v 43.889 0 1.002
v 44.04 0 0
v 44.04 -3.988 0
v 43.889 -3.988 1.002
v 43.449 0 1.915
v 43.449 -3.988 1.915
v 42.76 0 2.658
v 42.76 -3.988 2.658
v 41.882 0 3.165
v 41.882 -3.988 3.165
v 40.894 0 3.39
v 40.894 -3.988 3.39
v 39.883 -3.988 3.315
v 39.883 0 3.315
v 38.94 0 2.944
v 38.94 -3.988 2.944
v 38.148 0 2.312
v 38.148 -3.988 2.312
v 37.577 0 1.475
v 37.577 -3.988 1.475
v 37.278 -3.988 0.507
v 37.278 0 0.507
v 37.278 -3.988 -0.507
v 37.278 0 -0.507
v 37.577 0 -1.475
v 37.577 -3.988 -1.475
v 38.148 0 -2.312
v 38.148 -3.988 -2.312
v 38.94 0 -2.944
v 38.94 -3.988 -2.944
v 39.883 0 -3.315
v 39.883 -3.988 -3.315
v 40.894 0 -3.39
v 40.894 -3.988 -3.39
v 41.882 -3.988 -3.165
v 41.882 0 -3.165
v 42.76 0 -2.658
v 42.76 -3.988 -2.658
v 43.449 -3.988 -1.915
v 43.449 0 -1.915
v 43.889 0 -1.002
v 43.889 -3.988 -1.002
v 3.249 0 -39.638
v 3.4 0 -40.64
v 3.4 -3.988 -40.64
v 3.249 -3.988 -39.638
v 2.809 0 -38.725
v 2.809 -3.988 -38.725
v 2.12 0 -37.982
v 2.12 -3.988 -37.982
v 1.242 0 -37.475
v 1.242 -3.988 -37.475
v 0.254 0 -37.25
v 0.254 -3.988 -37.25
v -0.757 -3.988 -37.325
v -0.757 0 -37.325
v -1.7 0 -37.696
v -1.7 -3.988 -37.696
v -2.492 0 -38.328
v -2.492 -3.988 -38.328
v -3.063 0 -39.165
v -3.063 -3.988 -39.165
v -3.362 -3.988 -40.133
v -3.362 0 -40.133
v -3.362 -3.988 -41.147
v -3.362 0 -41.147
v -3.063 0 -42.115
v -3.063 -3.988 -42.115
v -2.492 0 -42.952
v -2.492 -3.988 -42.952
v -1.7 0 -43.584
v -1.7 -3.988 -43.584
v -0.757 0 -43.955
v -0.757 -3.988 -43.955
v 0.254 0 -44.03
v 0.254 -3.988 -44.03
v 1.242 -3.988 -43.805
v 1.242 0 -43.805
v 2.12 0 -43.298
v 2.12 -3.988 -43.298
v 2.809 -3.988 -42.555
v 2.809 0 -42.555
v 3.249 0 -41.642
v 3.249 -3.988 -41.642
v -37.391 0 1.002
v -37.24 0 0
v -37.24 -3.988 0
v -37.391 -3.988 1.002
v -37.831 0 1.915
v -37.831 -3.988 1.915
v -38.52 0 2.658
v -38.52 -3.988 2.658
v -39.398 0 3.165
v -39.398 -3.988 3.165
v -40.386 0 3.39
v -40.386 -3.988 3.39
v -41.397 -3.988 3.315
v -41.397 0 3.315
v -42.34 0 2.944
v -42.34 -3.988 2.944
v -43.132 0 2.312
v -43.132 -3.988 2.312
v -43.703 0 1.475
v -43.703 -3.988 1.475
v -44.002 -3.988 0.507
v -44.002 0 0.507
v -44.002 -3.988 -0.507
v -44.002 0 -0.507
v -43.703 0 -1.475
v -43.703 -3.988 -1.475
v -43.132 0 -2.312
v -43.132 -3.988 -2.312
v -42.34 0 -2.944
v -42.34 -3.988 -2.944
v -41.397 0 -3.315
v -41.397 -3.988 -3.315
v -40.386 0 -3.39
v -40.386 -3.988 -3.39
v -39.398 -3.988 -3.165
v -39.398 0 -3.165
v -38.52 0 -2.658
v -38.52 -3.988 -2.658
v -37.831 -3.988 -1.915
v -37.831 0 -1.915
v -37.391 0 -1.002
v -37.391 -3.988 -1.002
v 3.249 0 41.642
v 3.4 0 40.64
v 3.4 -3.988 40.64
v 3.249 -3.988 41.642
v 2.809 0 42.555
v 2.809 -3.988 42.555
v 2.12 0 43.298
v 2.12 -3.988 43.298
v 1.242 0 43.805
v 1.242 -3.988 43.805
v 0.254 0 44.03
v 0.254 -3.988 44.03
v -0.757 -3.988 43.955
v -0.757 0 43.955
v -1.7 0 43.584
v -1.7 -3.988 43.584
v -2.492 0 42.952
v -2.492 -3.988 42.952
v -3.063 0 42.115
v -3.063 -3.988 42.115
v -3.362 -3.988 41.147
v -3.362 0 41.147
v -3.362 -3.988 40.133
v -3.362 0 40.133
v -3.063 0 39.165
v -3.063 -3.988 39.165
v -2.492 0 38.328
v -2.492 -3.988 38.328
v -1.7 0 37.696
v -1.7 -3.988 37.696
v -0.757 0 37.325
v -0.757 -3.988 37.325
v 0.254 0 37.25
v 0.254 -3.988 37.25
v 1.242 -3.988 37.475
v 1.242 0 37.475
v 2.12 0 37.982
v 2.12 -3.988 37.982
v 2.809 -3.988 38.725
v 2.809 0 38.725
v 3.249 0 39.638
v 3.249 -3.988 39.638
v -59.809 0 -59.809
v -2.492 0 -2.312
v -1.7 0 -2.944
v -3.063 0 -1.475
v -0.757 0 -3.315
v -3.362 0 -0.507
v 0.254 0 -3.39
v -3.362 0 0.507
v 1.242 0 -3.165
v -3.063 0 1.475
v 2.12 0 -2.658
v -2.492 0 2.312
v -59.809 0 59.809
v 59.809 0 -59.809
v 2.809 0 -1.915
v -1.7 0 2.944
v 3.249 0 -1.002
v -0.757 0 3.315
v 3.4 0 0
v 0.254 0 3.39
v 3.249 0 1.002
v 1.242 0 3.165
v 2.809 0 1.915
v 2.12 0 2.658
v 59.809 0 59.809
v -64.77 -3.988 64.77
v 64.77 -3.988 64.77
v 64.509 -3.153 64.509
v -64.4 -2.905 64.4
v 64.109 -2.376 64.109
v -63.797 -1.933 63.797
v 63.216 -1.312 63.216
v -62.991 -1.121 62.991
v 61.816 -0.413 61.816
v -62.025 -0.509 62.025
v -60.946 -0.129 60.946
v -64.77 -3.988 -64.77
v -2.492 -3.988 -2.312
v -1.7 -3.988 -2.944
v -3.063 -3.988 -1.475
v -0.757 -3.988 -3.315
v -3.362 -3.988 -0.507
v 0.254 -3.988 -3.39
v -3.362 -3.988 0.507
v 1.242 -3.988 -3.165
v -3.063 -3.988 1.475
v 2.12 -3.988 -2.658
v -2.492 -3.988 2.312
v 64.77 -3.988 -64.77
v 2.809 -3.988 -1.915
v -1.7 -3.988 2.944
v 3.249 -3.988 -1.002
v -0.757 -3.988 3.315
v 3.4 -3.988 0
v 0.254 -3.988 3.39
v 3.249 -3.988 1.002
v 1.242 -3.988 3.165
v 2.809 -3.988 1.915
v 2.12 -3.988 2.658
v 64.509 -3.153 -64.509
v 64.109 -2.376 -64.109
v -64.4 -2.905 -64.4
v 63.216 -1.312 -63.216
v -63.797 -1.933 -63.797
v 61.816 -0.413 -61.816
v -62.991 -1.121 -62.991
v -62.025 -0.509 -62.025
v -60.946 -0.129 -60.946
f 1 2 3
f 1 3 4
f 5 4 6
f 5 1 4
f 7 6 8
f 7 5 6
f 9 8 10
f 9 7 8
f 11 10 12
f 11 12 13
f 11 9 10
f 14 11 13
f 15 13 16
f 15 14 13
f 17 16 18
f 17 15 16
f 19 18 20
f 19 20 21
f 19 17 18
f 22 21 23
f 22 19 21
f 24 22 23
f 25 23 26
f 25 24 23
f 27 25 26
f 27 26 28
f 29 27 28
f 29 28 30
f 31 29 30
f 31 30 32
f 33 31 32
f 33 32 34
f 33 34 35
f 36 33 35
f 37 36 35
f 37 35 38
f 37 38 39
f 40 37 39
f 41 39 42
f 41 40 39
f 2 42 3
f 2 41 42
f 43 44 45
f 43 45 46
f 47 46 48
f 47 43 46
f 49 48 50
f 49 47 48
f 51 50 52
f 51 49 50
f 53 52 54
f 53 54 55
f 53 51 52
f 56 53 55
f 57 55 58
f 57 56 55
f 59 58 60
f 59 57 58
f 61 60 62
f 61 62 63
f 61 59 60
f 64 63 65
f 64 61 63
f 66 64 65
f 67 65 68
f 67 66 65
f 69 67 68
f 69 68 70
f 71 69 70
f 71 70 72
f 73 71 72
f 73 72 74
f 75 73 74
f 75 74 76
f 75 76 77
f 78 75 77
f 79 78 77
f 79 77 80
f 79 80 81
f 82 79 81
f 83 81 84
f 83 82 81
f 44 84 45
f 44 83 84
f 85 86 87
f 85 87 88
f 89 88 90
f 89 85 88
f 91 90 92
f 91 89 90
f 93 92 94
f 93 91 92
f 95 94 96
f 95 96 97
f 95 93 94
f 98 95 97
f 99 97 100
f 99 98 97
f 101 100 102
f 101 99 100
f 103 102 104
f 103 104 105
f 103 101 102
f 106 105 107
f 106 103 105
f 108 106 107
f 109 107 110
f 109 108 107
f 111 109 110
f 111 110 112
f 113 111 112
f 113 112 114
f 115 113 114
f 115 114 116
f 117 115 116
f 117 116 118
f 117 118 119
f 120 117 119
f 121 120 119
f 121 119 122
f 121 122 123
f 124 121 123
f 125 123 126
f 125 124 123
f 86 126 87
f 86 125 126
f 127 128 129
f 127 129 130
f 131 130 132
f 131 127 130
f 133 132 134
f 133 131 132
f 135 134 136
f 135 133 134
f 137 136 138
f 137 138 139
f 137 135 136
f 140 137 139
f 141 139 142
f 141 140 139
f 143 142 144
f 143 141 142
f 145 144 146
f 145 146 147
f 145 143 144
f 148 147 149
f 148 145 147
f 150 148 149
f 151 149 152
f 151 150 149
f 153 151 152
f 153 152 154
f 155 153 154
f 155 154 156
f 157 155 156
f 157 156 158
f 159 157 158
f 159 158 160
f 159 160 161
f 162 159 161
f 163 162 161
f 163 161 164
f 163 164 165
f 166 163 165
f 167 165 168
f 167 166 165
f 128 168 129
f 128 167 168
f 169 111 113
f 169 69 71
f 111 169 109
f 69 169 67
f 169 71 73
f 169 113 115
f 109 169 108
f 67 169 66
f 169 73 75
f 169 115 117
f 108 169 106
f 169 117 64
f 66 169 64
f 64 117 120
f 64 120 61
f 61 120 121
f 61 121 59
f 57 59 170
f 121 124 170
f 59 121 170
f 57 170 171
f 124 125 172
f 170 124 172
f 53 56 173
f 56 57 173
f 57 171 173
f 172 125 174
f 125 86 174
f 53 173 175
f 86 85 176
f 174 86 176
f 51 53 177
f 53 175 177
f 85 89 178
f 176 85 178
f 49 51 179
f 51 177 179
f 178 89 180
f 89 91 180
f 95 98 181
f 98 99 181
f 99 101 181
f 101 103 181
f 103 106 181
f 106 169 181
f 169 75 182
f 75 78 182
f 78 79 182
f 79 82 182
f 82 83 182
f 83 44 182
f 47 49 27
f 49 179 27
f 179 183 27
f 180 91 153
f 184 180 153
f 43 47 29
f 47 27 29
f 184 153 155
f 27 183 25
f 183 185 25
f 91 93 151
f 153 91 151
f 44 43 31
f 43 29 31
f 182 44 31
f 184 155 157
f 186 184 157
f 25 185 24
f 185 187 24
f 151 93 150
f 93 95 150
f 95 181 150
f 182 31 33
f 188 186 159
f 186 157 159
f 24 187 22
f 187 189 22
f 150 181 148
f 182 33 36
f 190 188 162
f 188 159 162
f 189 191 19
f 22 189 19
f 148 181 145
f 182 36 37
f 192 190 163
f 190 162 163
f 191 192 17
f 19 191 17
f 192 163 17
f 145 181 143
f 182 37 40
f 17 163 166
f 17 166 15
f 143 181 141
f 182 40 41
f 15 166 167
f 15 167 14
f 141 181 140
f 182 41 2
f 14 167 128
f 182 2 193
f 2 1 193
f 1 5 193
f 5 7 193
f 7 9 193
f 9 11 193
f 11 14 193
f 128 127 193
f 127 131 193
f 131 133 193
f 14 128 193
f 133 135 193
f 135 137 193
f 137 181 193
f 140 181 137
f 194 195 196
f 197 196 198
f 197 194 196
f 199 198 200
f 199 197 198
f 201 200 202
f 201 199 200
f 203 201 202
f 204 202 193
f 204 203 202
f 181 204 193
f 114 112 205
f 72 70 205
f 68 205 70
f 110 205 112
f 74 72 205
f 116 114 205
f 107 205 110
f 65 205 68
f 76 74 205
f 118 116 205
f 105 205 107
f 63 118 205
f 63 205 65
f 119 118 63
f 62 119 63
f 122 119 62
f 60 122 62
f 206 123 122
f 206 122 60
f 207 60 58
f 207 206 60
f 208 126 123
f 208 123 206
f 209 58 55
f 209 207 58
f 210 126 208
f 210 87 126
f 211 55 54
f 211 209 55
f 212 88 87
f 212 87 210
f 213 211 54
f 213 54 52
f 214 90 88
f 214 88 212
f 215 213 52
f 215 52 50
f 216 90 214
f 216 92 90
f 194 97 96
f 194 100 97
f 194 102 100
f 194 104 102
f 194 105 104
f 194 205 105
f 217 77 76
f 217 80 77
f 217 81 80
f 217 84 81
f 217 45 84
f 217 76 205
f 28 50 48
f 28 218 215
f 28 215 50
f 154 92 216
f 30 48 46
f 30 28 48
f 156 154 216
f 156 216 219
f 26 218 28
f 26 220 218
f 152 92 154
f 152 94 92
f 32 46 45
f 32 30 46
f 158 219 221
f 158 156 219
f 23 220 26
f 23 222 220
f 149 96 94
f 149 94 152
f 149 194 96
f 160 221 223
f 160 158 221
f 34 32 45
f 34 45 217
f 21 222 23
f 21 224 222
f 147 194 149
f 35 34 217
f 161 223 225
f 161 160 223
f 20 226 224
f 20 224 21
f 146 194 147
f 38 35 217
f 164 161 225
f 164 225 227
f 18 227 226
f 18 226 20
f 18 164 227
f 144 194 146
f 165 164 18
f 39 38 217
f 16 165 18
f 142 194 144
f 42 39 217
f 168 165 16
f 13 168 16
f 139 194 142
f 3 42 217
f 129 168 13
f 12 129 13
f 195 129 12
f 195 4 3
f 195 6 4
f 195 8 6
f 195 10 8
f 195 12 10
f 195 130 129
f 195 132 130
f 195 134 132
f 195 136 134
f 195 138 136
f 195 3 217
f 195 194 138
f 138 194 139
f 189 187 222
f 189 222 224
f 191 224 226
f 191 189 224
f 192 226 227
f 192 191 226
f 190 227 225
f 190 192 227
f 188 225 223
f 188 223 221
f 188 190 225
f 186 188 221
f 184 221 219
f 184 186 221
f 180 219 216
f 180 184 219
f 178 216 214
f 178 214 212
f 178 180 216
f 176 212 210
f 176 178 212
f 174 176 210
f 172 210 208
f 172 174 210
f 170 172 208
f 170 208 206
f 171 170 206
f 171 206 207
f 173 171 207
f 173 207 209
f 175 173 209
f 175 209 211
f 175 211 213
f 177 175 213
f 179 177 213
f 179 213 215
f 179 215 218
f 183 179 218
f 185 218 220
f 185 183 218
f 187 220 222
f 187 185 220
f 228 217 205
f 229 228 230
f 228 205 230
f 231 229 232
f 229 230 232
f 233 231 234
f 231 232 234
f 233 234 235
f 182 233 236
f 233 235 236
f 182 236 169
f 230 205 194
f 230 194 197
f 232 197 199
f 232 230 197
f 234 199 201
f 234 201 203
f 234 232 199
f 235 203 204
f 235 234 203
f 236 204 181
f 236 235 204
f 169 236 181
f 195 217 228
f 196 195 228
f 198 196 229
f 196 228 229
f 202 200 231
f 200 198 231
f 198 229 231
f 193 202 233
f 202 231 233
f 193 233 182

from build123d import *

# Parameters (mm, degrees)
F0_W        = 129.54
F0_H        = 129.54
F0_R        = 3.39979
F1_DEPTH    = 3.9878
F2_T1_DEPTH = 154.3459968354
F2_T3_DEPTH = 154.3459968354


# Not quite as in the source:
# - a fillet or chamfer that OpenCascade refuses, or shapes differently, is made with other operations: its cross-section is extruded or revolved along the edge and cut away or added


with BuildPart() as f1:
    # F0 (on Front) → F1 (new body)
    with BuildSketch(Plane.XZ):
        Rectangle(F0_W, F0_H)
        with Locations((0, -40.64)):
            Circle(F0_R, mode=Mode.SUBTRACT)
        with Locations((-40.64, 0)):
            Circle(F0_R, mode=Mode.SUBTRACT)
        Circle(F0_R, mode=Mode.SUBTRACT)
        with Locations((40.64, 0)):
            Circle(F0_R, mode=Mode.SUBTRACT)
        with Locations((0, 40.64)):
            Circle(F0_R, mode=Mode.SUBTRACT)
    extrude(amount=F1_DEPTH)

    # F2: fillet of radius 5.08 on 4 edges, made by hand

    # F2_s2 → F2_t1 (cut)
    with BuildSketch(Plane.XY.offset(-77.1729984177)):
        with BuildLine():
            ThreePointArc((-64.77, -3.9878), (-62.9914115108, -1.1205318539), (-59.8088006329, 0))
            Line((-59.8088006329, 0), (-64.77, 0))
            Line((-64.77, 0), (-64.77, -3.9878))
        make_face()
        with BuildLine():
            ThreePointArc((64.77, -3.9878), (62.9914115108, -1.1205318539), (59.8088006329, 0))
            Line((59.8088006329, 0), (64.77, 0))
            Line((64.77, 0), (64.77, -3.9878))
        make_face()
    extrude(amount=F2_T1_DEPTH, mode=Mode.SUBTRACT)

    # F2_s4 → F2_t3 (cut)
    with BuildSketch(Plane.YZ.offset(-77.1729984177)):
        with BuildLine():
            ThreePointArc((-3.9878, -64.77), (-1.1205318539, -62.9914115108), (0, -59.8088006329))
            Line((0, -59.8088006329), (0, -64.77))
            Line((0, -64.77), (-3.9878, -64.77))
        make_face()
        with BuildLine():
            ThreePointArc((-3.9878, 64.77), (-1.1205318539, 62.9914115108), (0, 59.8088006329))
            Line((0, 59.8088006329), (0, 64.77))
            Line((0, 64.77), (-3.9878, 64.77))
        make_face()
    extrude(amount=F2_T3_DEPTH, mode=Mode.SUBTRACT)


solid = f1.part
